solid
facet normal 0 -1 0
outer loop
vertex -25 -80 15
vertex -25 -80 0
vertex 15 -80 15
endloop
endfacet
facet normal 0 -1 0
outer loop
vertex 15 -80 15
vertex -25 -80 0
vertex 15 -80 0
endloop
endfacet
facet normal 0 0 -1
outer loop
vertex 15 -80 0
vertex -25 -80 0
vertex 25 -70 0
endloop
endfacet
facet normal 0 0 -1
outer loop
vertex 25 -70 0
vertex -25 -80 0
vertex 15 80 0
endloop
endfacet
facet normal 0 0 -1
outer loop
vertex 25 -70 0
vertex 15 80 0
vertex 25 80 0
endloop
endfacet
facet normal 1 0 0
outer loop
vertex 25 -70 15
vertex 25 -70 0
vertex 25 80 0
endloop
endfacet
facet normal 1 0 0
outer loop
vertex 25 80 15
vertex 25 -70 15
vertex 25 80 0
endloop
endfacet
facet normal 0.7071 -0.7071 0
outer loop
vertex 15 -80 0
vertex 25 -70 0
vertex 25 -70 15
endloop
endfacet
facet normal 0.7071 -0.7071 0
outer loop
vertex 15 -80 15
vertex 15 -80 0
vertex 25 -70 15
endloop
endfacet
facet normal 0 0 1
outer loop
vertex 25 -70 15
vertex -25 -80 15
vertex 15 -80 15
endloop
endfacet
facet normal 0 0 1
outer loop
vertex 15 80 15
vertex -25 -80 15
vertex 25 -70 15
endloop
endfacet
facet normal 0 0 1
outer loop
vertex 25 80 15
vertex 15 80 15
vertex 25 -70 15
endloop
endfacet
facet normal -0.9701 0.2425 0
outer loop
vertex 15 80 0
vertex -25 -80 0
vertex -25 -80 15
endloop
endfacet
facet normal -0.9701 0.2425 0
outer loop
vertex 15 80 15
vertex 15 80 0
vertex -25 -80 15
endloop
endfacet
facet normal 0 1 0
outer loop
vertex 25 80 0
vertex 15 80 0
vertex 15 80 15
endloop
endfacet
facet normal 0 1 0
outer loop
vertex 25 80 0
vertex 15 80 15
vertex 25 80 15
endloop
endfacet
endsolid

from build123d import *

# Parameters (mm, degrees)
F0_W     = 50
F0_H     = 160
F1_DEPTH = 15
F2_SIZE2 = 159.99999
F2_SIZE  = 39.99999
F3_SIZE2 = 10
F3_SIZE  = 10


# Not quite as in the source:
# - a fillet or chamfer is up to 0.001 mm smaller than in the source, because OpenCascade refuses the exact size


with BuildPart() as f1:
    # F0 (on Top) → F1 (new body)
    with BuildSketch(Plane.XY):
        Rectangle(F0_W, F0_H)
    extrude(amount=F1_DEPTH)

    # F2 (size 40 and 160 in the source; OpenCascade refuses exactly that, so slightly less here)
    f2_edges = [f1.edges().sort_by_distance(p)[0] for p in [
        (-25, 80, 7.5),
    ]]
    f2_side = f1.faces().sort_by_distance((0, 80, 7.5))[0]
    chamfer(f2_edges, length=F2_SIZE, length2=F2_SIZE2, reference=f2_side)

    # F3
    f3_edges = [f1.edges().sort_by_distance(p)[0] for p in [
        (25, -80, 7.5),
    ]]
    chamfer(f3_edges, length=F3_SIZE, length2=F3_SIZE2)


solid = f1.part
